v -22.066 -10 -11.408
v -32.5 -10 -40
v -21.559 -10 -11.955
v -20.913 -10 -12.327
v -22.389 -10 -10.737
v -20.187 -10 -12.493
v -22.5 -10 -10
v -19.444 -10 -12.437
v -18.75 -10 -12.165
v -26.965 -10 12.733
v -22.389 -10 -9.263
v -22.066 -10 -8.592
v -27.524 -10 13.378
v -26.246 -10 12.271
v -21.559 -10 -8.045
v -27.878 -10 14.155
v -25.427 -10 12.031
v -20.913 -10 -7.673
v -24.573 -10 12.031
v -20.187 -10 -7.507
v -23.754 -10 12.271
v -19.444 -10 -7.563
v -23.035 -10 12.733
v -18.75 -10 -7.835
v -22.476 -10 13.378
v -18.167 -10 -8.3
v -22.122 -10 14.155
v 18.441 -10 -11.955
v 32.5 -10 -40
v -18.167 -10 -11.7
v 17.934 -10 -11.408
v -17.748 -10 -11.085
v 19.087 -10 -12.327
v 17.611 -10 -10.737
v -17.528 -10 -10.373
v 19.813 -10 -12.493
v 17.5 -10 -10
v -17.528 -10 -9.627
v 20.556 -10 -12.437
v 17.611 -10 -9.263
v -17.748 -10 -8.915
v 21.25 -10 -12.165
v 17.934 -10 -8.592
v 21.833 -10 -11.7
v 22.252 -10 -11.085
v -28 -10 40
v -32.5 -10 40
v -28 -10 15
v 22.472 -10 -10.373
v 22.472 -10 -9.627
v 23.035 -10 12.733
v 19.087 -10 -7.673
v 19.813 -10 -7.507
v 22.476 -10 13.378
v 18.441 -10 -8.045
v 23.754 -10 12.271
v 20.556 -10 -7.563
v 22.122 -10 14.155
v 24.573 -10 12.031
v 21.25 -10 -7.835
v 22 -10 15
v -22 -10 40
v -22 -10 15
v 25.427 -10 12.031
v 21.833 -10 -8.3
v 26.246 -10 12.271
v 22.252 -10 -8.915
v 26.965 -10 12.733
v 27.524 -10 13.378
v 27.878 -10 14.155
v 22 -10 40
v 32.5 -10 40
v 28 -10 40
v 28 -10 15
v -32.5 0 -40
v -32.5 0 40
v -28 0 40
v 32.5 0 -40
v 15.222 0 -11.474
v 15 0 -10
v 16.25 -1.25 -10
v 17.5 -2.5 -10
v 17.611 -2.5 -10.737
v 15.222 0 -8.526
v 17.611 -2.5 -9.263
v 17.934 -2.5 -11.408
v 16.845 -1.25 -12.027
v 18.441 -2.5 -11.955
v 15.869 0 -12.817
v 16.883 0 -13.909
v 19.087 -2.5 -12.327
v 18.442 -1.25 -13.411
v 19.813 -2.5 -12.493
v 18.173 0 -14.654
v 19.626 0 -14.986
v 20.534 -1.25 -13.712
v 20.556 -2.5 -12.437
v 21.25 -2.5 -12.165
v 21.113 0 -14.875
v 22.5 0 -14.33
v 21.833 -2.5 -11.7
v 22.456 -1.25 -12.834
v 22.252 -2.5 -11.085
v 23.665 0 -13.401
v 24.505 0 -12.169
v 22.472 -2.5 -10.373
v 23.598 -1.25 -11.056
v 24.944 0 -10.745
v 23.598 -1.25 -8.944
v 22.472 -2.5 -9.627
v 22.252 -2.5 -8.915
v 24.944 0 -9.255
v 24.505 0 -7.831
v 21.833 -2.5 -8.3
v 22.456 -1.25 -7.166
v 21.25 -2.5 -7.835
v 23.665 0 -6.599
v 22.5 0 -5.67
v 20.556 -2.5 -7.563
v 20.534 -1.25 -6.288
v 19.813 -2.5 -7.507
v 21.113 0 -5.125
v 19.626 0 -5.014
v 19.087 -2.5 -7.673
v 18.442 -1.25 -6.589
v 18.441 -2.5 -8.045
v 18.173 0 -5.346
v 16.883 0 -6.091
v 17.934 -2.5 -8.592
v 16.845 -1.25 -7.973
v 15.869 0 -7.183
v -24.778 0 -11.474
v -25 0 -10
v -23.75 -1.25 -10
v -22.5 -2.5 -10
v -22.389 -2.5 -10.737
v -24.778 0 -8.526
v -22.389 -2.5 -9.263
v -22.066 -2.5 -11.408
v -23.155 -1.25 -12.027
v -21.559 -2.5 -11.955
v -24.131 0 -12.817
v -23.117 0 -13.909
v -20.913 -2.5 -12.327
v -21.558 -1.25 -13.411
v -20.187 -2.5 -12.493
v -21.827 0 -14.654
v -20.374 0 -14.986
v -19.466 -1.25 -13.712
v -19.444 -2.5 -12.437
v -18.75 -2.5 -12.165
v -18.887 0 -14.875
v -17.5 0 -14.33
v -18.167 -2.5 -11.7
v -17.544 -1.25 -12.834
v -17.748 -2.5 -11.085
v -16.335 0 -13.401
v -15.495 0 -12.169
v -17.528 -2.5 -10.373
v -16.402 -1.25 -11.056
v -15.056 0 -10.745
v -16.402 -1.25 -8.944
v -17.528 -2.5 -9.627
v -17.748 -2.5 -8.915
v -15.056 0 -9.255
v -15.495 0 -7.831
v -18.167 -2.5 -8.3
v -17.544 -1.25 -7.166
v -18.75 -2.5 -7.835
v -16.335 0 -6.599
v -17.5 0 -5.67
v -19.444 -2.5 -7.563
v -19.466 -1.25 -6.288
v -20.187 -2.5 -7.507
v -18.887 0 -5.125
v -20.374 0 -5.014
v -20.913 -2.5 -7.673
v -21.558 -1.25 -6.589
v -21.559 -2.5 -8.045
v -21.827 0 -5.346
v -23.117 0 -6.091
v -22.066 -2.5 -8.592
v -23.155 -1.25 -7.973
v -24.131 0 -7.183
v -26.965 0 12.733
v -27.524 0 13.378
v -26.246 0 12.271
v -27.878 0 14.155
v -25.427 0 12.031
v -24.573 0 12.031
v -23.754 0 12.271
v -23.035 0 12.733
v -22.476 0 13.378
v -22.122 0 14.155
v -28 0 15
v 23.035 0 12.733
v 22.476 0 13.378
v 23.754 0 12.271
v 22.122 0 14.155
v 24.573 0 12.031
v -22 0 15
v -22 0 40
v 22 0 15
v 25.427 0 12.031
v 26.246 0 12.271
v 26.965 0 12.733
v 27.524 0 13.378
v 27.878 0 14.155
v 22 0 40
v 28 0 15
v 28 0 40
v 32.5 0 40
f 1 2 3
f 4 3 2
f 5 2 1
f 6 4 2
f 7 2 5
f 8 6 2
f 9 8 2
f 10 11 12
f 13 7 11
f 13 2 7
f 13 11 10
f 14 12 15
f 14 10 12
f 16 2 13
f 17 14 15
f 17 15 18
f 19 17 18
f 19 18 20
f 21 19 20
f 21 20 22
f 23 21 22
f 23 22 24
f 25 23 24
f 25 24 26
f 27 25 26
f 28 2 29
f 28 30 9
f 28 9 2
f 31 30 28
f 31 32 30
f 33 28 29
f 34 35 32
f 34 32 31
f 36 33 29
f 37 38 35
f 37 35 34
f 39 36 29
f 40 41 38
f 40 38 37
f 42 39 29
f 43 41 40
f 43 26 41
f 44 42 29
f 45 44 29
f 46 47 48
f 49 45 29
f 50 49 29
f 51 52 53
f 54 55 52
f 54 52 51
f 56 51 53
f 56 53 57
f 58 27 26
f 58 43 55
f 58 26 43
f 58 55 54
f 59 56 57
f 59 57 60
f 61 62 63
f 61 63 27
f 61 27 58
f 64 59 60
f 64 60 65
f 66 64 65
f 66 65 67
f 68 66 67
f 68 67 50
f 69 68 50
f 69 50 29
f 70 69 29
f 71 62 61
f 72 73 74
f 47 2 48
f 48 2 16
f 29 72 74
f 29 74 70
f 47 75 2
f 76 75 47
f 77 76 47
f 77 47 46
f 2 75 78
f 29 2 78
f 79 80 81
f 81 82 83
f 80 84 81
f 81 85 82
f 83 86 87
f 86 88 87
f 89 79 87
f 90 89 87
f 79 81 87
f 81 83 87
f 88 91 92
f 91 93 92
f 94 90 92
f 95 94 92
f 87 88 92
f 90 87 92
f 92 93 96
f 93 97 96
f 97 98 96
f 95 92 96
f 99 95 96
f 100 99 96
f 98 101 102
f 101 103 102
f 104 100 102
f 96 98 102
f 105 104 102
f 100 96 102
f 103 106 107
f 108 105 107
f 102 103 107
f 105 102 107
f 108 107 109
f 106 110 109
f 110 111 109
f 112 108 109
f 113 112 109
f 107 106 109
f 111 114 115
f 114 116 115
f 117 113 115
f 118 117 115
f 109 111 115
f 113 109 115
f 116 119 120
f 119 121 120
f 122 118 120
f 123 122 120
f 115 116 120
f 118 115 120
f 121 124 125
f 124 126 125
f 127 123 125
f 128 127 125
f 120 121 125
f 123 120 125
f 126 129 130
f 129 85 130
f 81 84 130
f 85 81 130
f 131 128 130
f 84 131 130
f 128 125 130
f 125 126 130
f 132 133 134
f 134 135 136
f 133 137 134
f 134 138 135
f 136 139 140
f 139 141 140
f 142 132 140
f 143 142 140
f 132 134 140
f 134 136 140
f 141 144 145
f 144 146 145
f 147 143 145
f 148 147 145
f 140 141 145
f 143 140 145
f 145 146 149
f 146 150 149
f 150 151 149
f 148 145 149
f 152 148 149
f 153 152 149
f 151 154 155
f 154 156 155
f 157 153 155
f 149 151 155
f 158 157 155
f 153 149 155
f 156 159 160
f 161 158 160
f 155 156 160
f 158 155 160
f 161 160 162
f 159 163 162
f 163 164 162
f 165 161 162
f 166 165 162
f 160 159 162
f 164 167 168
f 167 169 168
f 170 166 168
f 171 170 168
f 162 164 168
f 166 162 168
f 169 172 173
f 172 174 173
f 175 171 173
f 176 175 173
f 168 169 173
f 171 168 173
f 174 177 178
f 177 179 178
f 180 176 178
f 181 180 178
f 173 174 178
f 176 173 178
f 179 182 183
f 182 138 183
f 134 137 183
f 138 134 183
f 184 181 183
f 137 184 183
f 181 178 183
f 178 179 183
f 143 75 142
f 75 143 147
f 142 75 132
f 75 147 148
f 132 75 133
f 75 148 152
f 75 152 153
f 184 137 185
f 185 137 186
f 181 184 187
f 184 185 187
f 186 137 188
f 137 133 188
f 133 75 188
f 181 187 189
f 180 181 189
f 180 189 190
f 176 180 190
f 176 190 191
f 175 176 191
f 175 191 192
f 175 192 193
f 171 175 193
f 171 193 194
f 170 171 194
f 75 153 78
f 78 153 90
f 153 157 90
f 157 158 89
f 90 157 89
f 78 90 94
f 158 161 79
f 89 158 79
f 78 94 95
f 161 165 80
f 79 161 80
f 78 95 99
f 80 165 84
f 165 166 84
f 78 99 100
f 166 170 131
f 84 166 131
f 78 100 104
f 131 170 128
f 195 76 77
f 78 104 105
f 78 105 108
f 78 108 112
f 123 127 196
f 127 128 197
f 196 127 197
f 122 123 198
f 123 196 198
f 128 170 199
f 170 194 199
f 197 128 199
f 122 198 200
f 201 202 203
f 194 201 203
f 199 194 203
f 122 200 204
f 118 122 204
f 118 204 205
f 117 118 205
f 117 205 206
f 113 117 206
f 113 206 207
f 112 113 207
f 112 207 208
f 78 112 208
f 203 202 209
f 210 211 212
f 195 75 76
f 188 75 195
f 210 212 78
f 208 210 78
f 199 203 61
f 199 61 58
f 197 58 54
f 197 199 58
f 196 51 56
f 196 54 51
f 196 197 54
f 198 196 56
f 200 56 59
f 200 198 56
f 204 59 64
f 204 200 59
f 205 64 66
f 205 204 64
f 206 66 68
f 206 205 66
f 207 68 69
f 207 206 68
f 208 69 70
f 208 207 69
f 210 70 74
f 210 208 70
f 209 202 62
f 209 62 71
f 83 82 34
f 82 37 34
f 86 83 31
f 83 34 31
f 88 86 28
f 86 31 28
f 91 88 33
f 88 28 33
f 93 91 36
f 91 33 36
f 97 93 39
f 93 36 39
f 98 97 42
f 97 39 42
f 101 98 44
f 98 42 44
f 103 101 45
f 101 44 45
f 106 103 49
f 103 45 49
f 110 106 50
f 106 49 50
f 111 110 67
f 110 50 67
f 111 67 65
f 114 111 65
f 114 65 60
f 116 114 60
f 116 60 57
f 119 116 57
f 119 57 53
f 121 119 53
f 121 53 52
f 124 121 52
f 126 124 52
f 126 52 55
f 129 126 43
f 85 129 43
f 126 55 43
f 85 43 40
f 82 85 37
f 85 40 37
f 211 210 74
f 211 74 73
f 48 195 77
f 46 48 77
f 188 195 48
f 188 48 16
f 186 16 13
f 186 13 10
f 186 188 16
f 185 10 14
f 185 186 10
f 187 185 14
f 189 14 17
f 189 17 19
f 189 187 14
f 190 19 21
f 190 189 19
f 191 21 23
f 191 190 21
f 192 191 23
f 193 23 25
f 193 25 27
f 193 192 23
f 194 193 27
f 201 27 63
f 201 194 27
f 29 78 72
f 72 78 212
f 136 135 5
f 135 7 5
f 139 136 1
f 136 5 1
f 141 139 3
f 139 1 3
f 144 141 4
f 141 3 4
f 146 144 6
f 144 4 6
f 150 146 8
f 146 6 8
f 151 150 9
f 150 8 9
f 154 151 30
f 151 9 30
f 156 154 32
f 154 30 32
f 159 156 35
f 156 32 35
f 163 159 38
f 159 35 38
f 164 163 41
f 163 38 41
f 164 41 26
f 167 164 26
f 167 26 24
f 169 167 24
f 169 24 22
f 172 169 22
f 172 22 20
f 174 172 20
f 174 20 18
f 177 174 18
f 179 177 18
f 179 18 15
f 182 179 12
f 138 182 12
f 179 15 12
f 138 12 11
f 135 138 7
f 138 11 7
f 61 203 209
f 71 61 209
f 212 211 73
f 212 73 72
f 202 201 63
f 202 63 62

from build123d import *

# Parameters (mm, degrees)
F0_W           = 65
F0_H           = 80
F1_DEPTH       = 10
F3_D           = 5
F3_CSINK_D     = 10
F3_CSINK_ANGLE = 90
F5_W           = 6
F5_H           = 25
F4_R           = 3
F7_DEPTH       = 10
F6_W           = 6
F6_H           = 25
F8_DEPTH       = 10
F9_R           = 3
F10_DEPTH      = 25


with BuildPart() as f1:
    # F0 (on Front) → F1 (new body)
    with BuildSketch(Plane.XZ):
        Rectangle(F0_W, F0_H)
    extrude(amount=F1_DEPTH)

    # F3 (through all)
    with Locations(Plane(origin=(0, 0, 0), x_dir=(1, 0, 0), z_dir=(0, 1, 0))):
        with Locations((-20, 10), (20, 10)):
            CounterSinkHole(F3_D / 2, F3_CSINK_D / 2, counter_sink_angle=F3_CSINK_ANGLE)

    # F5 (on Front) + F4 (on Front) → F7 (cut)
    with BuildSketch(Plane.XZ):
        with Locations((-25, 27.5)):
            Rectangle(F5_W, F5_H)
    with BuildSketch(Plane.XZ):
        with Locations((-25, 15)):
            Circle(F4_R)
    extrude(amount=F7_DEPTH, mode=Mode.SUBTRACT)

    # F6 (on Front) → F8 (cut)
    with BuildSketch(Plane.XZ):
        with Locations((25, 27.5)):
            Rectangle(F6_W, F6_H)
    extrude(amount=F8_DEPTH, mode=Mode.SUBTRACT)

    # F9 (on Front) → F10 (cut)
    with BuildSketch(Plane.XZ):
        with Locations((25, 15)):
            Circle(F9_R)
    extrude(amount=F10_DEPTH, mode=Mode.SUBTRACT)


solid = f1.part
